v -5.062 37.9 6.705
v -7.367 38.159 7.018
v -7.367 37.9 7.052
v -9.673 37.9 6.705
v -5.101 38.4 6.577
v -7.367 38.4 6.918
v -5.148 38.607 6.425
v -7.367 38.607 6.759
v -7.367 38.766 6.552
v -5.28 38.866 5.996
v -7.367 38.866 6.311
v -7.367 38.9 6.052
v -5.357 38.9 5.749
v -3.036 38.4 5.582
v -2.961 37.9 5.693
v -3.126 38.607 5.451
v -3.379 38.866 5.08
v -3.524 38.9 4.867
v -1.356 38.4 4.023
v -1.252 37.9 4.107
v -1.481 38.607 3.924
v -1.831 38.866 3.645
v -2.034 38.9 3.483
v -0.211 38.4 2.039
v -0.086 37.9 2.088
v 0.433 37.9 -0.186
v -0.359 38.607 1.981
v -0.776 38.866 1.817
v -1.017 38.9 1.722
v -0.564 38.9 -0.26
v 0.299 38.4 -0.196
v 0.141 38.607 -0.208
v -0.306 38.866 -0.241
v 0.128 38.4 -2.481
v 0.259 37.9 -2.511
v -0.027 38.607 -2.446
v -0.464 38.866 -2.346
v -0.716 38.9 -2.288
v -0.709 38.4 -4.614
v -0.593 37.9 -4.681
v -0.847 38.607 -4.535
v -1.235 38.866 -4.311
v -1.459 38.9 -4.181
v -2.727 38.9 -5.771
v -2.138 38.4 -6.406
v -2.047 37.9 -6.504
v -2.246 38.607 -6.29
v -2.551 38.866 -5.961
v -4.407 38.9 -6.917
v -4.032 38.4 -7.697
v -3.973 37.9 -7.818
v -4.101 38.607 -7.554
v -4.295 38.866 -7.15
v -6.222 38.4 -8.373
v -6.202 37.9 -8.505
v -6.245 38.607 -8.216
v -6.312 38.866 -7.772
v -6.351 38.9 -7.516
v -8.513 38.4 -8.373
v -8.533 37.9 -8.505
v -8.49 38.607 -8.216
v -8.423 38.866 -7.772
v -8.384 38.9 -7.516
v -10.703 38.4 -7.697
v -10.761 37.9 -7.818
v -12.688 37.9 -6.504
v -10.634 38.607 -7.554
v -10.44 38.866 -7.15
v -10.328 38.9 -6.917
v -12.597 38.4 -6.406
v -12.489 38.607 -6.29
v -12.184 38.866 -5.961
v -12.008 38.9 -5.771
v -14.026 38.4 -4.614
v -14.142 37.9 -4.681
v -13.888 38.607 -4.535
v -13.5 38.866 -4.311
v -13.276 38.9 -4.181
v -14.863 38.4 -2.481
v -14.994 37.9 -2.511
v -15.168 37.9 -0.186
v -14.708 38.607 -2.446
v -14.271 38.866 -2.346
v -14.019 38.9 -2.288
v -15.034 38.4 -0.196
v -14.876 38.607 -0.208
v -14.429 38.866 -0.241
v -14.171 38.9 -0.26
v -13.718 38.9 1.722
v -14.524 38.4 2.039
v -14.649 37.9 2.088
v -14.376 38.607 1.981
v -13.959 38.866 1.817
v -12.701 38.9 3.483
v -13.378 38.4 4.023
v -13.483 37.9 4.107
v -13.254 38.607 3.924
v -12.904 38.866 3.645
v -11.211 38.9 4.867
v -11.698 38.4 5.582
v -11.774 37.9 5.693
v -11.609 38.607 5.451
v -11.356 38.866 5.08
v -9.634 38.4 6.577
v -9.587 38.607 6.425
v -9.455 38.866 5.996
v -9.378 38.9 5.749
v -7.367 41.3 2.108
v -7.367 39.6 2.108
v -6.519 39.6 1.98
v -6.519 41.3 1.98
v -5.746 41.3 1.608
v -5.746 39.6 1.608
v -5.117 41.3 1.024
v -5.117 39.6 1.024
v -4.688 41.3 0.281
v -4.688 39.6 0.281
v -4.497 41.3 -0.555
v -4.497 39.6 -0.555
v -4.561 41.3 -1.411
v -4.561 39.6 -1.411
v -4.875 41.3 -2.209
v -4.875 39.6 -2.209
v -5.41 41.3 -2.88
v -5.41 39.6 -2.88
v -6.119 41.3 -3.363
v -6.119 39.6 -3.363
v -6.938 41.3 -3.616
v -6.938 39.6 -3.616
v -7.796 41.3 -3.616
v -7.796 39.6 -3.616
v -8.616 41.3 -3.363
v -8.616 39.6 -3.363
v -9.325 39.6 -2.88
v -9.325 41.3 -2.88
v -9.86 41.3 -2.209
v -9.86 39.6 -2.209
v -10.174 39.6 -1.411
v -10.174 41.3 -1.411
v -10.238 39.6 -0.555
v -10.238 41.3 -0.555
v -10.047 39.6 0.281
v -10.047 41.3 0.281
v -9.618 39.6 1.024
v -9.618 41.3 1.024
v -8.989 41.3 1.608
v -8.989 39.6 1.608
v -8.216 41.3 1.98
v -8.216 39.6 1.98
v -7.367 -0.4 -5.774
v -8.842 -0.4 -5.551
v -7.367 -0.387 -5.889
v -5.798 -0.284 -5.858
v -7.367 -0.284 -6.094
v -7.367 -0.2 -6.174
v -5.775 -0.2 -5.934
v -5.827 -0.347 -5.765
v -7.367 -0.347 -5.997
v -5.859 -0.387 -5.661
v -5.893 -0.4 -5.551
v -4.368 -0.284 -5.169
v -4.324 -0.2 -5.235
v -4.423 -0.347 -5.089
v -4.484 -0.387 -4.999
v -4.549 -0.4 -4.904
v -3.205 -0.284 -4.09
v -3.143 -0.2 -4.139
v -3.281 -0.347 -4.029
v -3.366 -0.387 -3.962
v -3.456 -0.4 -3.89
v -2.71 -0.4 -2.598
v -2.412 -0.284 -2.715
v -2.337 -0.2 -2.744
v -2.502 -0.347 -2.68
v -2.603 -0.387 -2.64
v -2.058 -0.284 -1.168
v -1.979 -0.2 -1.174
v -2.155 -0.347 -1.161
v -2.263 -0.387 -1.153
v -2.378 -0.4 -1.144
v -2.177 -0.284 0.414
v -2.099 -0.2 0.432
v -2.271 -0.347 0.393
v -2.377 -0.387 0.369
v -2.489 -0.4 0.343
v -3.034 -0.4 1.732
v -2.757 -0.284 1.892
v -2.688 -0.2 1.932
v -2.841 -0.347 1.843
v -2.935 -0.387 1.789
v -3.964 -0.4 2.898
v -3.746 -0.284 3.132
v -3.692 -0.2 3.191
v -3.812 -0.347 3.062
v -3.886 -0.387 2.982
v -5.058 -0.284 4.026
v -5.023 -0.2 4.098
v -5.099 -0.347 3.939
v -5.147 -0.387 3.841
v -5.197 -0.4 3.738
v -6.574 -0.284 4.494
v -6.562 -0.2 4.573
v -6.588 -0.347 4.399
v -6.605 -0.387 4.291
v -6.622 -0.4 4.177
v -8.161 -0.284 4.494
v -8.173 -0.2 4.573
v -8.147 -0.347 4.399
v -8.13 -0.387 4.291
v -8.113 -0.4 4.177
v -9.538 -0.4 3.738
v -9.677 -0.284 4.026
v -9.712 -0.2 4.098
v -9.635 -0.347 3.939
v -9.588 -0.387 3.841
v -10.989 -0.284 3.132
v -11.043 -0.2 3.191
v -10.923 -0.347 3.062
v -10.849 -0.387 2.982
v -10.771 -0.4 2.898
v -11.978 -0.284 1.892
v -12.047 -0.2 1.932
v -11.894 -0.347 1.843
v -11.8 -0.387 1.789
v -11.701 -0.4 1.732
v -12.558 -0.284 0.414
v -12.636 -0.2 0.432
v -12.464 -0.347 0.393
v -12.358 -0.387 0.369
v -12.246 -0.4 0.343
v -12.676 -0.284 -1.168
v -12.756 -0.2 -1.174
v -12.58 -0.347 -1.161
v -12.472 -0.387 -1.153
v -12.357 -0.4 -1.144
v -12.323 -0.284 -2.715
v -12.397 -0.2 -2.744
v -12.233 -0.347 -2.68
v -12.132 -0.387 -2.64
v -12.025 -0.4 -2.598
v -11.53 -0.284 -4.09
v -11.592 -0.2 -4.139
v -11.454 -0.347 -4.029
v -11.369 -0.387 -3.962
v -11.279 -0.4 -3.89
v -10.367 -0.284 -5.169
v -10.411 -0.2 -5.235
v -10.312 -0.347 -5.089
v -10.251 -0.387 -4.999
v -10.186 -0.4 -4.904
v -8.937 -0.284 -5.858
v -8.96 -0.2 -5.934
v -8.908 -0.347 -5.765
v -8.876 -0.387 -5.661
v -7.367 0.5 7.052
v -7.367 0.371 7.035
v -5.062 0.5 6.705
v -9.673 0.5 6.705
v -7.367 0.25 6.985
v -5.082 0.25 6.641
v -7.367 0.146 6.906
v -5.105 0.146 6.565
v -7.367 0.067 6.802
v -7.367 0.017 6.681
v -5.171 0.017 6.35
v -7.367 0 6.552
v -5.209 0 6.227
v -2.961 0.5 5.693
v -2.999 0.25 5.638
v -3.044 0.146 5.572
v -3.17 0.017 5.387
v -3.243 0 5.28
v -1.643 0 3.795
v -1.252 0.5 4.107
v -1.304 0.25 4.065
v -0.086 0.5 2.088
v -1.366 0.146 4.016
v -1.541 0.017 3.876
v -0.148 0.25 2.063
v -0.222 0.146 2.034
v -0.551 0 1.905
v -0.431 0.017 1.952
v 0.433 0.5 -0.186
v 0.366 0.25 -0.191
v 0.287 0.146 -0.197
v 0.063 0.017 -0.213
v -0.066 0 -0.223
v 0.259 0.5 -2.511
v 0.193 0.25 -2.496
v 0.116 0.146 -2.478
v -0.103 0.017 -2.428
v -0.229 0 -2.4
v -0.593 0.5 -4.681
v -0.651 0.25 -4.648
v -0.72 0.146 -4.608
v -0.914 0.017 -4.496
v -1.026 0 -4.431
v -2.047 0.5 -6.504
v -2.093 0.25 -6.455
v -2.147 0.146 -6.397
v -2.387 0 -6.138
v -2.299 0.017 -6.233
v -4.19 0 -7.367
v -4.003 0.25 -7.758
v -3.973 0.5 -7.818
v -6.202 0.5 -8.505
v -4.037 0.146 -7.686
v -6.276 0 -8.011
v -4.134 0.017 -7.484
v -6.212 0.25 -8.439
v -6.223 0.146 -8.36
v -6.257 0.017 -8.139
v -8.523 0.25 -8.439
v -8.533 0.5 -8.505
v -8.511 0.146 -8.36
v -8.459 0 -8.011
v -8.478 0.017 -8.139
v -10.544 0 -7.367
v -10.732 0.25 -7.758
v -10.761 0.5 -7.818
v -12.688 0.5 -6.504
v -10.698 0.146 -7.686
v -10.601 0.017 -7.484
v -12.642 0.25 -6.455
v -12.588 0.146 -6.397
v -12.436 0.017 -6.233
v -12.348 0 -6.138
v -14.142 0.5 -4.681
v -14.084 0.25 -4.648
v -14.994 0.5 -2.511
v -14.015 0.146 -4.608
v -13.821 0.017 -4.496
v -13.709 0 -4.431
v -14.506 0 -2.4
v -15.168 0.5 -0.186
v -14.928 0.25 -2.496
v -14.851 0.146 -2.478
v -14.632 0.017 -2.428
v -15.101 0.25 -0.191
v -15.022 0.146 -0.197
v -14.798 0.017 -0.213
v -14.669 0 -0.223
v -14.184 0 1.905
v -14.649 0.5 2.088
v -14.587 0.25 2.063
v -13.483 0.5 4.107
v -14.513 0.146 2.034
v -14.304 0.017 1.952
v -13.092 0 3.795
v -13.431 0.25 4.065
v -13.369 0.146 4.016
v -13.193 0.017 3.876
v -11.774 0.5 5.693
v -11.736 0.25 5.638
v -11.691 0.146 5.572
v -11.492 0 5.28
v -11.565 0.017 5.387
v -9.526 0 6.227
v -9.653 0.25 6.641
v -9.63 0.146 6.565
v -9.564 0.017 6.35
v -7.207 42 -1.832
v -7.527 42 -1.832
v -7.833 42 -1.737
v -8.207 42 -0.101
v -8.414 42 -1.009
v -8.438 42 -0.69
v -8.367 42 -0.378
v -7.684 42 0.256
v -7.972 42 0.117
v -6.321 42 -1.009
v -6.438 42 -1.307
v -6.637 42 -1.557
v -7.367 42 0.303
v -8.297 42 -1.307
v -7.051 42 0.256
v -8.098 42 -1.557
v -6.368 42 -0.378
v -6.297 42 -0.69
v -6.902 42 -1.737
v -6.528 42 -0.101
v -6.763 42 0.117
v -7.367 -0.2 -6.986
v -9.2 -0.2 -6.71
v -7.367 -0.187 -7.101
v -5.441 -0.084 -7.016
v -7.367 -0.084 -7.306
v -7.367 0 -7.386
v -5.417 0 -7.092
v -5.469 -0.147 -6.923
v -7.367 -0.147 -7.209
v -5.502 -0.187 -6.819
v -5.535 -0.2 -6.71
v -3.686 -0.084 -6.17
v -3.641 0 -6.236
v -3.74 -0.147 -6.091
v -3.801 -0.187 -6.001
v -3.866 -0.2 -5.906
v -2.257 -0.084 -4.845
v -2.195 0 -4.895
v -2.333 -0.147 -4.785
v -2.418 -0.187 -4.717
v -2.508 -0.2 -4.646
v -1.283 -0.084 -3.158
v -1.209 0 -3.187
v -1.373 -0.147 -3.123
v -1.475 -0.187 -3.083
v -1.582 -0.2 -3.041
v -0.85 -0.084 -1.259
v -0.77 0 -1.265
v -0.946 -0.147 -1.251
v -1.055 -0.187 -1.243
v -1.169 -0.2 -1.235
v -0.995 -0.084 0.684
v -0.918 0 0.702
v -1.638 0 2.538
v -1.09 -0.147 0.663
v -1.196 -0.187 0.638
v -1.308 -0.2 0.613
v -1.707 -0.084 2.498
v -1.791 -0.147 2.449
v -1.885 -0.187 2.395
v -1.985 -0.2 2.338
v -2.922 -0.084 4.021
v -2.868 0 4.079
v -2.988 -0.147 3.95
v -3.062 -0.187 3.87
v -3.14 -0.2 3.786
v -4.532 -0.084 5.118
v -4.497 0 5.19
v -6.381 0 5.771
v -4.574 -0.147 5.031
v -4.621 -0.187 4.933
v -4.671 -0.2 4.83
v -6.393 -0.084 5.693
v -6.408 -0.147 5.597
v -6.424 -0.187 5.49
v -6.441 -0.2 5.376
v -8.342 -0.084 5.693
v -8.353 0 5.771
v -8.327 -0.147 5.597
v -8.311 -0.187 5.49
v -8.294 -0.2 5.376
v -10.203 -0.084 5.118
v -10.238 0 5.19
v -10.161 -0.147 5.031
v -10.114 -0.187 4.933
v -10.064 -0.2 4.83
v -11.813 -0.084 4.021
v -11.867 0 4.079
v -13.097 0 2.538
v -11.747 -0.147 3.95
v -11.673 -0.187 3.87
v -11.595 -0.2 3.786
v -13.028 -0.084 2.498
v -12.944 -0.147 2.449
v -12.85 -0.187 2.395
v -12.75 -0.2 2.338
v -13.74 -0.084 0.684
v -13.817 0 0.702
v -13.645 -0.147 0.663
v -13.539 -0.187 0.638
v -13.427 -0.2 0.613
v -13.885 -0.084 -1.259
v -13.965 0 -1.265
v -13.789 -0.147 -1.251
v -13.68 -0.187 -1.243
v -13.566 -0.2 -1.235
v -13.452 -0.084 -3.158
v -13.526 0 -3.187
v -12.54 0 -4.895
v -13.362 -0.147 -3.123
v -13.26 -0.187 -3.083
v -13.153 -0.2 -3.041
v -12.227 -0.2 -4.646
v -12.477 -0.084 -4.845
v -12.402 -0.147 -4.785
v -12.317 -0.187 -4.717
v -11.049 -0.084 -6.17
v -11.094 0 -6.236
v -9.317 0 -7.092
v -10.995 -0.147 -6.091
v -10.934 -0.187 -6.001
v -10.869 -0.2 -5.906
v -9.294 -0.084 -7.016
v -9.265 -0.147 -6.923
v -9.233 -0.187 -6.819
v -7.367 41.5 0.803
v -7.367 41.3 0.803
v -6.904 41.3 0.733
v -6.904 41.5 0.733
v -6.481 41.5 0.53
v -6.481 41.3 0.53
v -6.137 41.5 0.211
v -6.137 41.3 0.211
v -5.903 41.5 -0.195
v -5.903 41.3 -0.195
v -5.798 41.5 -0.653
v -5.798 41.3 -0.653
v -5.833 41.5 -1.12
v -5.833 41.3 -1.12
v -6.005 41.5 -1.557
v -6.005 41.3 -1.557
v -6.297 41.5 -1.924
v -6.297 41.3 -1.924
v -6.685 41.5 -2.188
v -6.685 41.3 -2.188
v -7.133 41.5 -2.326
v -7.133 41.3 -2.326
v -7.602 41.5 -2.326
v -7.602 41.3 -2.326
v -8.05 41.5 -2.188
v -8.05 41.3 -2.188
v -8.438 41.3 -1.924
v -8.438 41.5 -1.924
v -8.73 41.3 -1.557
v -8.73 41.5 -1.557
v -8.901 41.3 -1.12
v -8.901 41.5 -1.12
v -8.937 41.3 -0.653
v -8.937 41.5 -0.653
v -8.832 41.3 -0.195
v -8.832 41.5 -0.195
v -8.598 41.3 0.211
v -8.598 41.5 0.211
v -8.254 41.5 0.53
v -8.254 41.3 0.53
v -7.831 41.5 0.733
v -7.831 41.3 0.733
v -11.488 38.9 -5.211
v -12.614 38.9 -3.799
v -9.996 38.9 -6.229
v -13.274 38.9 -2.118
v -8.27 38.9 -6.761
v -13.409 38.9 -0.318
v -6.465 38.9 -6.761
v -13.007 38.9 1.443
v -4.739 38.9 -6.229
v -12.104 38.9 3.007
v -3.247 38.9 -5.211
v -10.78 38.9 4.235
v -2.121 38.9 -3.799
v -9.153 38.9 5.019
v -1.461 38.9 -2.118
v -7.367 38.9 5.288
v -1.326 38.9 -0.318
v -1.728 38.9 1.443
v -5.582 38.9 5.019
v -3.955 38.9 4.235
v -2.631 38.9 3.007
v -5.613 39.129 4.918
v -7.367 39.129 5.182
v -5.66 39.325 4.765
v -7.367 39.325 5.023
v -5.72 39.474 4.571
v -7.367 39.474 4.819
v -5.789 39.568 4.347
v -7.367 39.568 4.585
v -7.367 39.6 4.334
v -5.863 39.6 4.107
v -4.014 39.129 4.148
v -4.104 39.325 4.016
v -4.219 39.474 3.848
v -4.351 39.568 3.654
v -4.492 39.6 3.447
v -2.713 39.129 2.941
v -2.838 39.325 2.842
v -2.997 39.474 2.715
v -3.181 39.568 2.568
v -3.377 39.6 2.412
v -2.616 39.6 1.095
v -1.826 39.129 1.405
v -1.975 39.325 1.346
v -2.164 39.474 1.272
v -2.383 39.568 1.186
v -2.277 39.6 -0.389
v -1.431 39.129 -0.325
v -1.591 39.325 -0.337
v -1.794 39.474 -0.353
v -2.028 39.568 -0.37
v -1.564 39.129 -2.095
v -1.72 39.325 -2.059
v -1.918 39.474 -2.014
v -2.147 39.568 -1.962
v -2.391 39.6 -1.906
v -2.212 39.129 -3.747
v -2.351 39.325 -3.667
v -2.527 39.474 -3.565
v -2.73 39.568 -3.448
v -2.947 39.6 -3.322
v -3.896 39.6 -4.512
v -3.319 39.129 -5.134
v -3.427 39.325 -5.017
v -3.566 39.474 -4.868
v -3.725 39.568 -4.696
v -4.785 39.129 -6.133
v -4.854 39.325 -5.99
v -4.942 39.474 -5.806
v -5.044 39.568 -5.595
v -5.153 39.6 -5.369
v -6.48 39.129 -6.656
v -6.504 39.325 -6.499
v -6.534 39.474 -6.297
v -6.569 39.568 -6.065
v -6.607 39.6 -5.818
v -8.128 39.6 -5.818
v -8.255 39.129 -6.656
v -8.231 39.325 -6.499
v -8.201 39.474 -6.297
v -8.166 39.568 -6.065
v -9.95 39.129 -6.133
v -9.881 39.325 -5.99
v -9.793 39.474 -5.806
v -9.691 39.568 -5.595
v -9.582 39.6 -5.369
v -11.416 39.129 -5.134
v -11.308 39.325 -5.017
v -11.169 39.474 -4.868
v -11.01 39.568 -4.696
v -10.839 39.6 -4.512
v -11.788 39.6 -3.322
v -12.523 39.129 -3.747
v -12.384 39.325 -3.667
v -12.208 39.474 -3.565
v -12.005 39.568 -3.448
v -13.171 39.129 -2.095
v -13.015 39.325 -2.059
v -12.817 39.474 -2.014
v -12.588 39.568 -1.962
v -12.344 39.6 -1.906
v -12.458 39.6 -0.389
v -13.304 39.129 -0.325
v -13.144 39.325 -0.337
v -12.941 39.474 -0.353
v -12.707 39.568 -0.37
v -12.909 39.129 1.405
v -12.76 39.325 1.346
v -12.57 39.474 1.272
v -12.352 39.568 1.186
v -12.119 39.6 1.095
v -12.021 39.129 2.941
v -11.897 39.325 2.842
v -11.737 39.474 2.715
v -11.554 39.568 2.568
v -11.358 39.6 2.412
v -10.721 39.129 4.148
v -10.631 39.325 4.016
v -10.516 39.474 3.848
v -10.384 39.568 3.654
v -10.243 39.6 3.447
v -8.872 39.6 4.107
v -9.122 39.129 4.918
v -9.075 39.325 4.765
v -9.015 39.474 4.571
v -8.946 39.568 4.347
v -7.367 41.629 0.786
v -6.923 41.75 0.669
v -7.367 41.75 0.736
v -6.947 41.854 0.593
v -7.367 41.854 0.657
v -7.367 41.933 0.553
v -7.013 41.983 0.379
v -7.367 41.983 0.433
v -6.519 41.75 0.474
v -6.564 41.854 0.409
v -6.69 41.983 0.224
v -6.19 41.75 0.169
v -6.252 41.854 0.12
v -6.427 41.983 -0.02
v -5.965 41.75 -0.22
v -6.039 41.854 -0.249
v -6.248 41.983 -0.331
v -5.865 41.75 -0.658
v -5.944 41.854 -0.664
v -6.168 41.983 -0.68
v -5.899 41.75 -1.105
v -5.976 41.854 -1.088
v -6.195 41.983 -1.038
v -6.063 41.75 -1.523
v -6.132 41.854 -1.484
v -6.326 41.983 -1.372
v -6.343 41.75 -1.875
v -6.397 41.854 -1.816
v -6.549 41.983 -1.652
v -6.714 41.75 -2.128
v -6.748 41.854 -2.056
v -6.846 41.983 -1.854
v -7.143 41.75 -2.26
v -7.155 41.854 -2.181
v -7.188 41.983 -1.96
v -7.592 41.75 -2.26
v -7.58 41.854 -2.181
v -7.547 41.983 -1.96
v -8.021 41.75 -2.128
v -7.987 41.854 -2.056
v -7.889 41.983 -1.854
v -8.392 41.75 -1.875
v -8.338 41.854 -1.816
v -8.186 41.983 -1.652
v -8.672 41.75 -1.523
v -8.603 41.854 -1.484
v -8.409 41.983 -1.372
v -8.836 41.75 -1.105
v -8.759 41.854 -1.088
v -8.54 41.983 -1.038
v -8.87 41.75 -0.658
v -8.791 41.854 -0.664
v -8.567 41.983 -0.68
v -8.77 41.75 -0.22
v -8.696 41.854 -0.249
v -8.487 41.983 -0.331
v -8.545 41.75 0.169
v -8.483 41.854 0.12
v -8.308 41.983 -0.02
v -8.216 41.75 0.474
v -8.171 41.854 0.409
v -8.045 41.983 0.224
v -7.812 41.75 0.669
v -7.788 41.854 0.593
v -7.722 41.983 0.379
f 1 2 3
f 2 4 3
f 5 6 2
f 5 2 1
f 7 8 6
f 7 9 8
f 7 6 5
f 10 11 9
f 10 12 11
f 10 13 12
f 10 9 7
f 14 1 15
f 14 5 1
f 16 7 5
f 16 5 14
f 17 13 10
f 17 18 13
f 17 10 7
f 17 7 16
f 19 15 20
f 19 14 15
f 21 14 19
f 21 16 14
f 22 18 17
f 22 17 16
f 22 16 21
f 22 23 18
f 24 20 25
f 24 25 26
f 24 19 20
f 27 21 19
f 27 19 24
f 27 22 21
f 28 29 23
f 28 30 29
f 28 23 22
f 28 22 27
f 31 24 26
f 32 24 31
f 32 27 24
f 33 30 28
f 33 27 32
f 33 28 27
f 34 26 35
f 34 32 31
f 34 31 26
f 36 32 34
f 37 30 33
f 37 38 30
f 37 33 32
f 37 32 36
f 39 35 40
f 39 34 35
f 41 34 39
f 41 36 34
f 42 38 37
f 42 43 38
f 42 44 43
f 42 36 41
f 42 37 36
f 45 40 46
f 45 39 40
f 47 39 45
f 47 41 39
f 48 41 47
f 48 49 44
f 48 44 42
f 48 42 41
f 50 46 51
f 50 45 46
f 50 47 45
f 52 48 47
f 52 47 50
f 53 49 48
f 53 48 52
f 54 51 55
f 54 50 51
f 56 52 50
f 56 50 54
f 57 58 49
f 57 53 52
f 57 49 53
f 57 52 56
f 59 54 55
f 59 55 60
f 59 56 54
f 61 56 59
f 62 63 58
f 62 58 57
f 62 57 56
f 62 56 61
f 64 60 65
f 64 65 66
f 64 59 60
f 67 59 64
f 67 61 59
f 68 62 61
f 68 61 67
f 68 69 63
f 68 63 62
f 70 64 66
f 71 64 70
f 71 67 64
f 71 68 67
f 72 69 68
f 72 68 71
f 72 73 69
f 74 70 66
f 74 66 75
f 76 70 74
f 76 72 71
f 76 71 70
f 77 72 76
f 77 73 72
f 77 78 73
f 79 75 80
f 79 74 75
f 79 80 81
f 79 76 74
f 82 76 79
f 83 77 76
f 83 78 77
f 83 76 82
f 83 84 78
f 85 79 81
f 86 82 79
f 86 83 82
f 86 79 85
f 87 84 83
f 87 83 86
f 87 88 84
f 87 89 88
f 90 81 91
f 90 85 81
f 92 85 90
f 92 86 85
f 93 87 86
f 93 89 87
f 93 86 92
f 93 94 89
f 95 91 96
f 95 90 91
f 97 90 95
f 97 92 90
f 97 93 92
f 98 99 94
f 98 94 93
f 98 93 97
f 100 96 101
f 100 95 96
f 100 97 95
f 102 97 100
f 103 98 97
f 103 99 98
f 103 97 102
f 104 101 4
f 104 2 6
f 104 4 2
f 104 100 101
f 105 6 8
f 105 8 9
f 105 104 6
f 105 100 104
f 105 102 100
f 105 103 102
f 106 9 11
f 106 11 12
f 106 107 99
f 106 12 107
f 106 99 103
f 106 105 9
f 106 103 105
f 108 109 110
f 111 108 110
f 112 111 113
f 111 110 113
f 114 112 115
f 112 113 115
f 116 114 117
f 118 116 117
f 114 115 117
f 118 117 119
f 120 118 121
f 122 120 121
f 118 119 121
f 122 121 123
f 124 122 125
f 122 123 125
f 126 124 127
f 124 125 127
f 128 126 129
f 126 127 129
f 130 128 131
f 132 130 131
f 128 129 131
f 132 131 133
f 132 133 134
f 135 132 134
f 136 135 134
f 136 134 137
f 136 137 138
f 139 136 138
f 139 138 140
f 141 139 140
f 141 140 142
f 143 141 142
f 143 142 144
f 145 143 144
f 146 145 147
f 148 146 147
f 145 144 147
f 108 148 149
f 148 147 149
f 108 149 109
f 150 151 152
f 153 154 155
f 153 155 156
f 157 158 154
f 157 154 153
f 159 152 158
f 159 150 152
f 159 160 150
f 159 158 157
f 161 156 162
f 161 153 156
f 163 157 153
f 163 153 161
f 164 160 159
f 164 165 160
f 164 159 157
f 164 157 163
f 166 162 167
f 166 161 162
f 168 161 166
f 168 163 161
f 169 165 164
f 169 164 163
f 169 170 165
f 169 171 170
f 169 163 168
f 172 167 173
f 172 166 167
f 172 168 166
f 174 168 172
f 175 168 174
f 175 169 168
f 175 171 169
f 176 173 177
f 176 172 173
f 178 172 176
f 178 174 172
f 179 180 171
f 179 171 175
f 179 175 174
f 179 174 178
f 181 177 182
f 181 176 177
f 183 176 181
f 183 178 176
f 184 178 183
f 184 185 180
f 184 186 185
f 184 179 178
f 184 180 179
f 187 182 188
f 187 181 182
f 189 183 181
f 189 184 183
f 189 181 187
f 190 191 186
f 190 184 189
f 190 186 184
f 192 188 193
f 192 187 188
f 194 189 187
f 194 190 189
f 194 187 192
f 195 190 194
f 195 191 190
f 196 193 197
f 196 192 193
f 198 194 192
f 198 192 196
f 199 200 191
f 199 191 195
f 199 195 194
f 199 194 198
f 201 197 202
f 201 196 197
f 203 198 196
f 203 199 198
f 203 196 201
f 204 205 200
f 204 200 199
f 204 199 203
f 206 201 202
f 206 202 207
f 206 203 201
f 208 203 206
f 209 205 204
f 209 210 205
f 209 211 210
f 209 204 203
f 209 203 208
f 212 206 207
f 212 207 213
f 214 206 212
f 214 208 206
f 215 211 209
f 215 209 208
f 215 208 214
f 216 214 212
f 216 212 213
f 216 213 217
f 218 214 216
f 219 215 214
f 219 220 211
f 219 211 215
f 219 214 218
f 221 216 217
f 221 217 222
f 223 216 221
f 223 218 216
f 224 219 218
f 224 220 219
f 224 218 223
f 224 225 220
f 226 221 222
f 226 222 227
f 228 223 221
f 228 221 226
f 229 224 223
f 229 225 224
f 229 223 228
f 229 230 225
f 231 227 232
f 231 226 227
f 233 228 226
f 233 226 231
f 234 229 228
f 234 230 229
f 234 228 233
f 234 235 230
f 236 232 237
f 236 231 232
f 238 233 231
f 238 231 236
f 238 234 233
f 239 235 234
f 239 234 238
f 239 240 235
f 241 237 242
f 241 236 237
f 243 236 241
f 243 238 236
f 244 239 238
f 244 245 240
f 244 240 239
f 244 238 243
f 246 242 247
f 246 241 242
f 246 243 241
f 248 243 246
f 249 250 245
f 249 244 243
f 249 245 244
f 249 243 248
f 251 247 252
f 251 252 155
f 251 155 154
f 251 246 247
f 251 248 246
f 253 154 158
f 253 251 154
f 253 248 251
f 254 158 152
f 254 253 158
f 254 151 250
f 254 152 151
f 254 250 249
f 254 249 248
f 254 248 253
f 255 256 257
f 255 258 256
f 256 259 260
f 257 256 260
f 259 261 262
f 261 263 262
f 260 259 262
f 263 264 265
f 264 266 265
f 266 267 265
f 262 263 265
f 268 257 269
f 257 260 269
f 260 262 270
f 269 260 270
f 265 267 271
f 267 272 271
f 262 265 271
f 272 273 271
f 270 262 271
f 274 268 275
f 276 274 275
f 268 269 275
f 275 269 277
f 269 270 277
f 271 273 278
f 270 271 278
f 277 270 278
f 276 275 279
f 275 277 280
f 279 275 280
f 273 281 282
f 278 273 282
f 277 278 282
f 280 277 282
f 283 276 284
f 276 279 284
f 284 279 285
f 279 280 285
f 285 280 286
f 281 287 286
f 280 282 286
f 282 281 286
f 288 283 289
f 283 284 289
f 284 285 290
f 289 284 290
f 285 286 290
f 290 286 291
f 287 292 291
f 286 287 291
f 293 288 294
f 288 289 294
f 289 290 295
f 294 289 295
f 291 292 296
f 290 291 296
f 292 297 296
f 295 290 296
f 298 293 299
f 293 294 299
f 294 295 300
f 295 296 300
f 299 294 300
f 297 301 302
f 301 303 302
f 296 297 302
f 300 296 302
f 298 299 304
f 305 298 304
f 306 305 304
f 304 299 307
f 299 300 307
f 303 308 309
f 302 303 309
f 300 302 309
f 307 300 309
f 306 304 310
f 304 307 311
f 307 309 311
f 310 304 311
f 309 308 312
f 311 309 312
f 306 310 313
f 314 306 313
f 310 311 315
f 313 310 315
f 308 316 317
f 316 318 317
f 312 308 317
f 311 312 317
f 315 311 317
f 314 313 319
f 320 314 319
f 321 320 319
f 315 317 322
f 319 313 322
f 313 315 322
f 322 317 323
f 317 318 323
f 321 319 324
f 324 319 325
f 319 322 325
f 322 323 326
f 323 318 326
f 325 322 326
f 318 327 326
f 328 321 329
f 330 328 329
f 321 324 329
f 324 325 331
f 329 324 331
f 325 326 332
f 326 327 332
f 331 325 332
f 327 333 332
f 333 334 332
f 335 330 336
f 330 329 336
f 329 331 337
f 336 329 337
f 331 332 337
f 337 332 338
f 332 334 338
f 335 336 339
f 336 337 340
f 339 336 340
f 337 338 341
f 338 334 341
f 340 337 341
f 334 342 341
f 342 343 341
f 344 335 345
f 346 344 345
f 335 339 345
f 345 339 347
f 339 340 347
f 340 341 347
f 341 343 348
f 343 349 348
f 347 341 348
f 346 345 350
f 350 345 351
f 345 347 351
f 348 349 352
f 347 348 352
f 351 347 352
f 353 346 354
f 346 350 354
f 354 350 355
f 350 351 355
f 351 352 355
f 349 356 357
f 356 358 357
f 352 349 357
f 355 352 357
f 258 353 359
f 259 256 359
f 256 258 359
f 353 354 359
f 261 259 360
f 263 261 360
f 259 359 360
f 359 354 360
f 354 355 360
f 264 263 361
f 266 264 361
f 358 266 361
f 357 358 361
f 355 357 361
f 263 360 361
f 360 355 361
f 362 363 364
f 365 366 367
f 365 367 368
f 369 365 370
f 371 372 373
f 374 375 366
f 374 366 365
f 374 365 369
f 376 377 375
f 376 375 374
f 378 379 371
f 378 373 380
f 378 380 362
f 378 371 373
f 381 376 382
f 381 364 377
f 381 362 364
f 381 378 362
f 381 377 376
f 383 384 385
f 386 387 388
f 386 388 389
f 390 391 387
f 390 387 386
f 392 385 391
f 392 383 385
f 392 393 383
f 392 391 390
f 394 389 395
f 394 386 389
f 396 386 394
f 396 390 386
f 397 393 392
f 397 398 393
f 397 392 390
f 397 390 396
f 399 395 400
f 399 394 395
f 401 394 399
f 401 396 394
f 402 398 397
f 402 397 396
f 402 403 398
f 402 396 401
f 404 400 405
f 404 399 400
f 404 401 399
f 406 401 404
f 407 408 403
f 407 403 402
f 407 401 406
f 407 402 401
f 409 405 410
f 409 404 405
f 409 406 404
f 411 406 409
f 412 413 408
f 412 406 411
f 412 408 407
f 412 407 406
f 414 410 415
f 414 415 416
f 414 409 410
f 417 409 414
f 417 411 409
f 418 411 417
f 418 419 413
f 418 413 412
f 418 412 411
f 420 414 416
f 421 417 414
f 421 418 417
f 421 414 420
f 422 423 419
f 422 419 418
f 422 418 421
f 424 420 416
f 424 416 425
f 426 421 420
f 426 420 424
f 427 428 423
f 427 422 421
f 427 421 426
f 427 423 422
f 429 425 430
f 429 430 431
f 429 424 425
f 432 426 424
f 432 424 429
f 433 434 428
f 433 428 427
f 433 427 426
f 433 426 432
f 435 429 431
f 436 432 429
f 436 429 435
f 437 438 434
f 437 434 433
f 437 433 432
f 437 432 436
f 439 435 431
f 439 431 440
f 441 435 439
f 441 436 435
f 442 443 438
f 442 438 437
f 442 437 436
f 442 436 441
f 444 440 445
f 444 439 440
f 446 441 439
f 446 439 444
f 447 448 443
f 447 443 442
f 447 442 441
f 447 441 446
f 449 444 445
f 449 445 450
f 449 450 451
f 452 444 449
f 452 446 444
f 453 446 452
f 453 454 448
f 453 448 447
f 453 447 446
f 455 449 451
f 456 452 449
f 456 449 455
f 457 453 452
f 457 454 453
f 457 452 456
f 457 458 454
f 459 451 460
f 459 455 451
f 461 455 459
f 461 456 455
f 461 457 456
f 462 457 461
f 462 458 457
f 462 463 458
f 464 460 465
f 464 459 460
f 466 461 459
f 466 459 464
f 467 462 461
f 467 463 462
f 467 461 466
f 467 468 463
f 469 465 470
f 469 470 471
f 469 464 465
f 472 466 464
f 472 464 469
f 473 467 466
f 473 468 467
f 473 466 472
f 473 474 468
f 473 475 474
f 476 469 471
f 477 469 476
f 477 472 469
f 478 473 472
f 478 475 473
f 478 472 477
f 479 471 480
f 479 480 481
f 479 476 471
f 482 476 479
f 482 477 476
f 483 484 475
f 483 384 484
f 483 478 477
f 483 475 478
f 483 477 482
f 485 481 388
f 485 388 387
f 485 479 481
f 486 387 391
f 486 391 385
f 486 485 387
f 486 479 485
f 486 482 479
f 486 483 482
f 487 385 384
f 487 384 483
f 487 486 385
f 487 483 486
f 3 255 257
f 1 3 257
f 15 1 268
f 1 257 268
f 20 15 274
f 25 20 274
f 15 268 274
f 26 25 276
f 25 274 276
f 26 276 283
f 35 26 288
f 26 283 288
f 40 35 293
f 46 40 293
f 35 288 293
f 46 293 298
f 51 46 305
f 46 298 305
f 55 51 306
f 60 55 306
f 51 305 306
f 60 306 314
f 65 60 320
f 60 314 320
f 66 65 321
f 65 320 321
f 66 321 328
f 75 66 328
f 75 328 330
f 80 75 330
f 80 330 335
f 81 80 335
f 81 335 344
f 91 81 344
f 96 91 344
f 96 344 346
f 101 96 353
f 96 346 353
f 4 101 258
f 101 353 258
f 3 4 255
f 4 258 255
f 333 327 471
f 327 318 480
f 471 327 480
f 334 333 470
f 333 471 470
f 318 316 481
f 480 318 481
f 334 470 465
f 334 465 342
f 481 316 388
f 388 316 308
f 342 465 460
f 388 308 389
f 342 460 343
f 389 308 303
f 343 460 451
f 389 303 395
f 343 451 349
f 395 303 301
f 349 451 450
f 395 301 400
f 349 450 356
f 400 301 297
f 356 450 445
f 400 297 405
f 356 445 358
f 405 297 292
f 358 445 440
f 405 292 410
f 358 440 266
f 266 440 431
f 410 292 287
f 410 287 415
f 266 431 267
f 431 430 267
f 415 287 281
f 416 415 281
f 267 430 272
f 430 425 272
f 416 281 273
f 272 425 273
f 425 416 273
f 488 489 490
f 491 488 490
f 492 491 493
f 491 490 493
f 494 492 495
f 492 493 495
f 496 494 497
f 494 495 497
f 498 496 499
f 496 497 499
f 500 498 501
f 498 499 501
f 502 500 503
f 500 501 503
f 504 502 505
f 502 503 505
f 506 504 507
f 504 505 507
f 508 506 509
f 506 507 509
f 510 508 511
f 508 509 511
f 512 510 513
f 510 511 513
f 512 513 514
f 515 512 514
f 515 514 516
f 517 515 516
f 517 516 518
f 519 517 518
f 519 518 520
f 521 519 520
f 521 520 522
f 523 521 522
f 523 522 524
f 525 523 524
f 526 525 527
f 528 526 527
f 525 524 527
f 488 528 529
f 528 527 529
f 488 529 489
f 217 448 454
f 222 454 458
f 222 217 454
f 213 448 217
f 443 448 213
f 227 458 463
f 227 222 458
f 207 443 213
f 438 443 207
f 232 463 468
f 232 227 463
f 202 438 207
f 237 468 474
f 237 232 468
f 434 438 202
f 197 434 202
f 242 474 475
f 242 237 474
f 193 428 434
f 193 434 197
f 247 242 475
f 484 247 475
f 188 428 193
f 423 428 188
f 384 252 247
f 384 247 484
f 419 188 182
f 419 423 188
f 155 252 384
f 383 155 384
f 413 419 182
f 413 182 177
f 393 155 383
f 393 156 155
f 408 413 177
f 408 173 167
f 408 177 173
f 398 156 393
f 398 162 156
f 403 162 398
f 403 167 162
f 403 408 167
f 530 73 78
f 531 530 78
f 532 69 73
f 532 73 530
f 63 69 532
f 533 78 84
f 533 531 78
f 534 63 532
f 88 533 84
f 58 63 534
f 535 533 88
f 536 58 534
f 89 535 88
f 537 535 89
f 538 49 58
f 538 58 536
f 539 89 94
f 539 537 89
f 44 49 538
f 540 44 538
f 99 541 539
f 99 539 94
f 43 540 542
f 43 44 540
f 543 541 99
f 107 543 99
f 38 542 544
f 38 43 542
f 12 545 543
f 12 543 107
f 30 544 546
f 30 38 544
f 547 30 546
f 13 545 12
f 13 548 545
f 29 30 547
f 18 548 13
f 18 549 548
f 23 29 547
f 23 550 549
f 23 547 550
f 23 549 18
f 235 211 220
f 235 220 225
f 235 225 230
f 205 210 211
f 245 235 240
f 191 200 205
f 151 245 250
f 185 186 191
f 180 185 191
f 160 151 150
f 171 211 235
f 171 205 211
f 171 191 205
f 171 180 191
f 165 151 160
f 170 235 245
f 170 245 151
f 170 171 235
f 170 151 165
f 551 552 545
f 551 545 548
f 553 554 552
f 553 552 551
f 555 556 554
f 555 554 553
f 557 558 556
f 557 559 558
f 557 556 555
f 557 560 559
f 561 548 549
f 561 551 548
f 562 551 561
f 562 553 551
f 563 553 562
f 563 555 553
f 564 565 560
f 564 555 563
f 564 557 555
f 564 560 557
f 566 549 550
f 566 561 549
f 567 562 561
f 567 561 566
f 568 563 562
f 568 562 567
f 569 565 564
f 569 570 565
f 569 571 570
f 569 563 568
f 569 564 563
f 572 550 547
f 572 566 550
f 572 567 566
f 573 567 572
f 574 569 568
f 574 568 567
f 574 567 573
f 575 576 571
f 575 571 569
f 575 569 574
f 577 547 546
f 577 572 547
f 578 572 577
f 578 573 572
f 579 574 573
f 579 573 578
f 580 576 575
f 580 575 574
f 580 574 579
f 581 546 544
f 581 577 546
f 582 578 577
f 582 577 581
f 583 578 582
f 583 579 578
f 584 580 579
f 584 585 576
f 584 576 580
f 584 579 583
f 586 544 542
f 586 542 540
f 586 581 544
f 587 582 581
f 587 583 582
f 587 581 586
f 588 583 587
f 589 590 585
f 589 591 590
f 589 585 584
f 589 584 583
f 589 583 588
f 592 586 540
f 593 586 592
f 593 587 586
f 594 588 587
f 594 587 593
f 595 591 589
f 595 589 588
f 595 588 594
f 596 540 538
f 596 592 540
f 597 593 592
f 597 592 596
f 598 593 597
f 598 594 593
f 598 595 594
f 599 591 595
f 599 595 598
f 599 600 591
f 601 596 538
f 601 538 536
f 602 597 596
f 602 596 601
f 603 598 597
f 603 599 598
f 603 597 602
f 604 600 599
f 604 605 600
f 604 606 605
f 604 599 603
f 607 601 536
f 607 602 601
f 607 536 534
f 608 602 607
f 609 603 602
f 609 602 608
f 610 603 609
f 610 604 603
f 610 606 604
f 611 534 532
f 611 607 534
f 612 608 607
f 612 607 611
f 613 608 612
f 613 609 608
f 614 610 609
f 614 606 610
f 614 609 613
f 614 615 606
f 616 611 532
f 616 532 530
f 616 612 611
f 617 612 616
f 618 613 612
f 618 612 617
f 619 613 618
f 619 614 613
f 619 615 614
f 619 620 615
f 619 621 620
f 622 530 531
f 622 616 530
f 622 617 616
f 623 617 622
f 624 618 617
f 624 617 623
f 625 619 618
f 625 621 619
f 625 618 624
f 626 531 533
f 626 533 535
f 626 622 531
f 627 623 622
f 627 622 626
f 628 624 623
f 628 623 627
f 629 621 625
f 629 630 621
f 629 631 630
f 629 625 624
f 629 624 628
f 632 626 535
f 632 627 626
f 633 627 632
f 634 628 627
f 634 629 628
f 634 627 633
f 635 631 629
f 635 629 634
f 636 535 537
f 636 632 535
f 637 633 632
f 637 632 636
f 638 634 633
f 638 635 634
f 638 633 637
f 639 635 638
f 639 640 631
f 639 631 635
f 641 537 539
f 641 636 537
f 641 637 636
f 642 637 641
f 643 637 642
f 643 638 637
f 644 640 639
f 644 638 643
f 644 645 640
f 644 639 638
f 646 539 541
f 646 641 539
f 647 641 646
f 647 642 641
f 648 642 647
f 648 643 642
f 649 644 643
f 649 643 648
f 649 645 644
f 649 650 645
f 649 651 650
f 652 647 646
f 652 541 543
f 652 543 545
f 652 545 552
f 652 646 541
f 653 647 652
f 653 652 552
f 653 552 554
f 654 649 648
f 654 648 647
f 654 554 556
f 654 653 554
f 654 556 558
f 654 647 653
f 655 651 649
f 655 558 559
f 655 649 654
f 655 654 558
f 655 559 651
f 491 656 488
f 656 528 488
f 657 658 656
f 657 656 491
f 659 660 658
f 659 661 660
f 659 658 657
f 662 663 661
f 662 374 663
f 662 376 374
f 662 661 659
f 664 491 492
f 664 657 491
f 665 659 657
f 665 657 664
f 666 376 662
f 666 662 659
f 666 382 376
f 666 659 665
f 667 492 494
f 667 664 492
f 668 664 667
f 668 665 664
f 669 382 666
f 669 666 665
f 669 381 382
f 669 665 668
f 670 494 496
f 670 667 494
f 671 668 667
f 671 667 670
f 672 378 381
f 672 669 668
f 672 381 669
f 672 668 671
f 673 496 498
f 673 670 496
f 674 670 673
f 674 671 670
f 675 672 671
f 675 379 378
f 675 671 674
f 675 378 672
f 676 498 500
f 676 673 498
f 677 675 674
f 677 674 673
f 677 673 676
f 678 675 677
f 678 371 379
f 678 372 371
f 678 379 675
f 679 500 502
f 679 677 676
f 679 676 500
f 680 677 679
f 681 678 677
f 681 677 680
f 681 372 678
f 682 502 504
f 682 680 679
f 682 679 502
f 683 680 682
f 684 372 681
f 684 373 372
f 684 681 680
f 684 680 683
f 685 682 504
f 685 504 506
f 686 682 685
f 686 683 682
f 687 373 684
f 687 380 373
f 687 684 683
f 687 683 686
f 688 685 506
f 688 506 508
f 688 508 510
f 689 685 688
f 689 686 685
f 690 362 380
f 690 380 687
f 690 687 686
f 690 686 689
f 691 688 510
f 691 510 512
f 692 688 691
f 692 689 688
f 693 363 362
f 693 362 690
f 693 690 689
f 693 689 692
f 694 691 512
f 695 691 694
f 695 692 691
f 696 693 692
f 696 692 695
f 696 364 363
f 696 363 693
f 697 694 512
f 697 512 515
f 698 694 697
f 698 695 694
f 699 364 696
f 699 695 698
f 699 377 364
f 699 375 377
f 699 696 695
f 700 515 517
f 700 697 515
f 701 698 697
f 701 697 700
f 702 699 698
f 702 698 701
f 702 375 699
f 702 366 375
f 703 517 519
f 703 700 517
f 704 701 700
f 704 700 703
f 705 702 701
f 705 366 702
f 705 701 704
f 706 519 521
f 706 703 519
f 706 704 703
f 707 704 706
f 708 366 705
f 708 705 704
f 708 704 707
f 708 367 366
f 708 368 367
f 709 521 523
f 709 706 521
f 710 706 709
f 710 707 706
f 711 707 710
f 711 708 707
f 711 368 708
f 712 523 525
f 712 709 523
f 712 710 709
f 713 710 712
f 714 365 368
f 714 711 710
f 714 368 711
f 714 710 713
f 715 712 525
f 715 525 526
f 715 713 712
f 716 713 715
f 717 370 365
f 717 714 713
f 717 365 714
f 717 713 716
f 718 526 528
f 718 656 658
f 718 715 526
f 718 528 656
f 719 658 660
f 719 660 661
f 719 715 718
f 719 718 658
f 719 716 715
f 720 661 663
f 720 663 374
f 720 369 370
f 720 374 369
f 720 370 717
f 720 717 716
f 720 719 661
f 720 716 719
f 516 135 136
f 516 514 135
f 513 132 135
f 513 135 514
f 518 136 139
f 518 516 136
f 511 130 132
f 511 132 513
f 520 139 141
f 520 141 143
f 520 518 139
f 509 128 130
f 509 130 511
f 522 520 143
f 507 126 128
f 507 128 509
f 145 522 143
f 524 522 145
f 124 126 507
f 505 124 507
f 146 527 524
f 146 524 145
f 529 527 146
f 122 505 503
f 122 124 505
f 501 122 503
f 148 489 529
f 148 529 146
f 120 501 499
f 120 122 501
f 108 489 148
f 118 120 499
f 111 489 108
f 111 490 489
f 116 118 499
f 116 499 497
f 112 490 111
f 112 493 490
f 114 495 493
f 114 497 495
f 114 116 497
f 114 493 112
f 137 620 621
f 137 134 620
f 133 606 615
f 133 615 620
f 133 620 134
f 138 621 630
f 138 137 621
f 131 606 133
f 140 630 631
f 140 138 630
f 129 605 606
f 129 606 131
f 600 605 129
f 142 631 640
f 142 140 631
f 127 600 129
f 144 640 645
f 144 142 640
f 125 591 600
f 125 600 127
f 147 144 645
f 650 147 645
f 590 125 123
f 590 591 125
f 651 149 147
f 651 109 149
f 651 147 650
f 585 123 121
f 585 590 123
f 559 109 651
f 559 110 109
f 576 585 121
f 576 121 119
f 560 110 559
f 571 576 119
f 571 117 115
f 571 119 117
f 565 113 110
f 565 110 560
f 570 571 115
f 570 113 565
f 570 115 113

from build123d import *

# Parameters (mm, degrees)
SKETCH1_R            = 7.822299743
BOSS_EXTRUDE1_DEPTH  = 38.9
FILLET1_R            = 1
SKETCH7_R            = 6.058269956
BOSS_EXTRUDE7_DEPTH  = 0.7
FILLET5_R            = 1
SKETCH8_R            = 2.878199419
BOSS_EXTRUDE8_DEPTH  = 1.7
SKETCH9_R            = 1.57347679
BOSS_EXTRUDE9_DEPTH  = 0.7
FILLET7_R            = 0.5
SKETCH10_R           = 6.615584601
BOSS_EXTRUDE11_DEPTH = 0.2
FILLET8_R            = 0.5
FILLET9_R            = 0.5
SKETCH11_R           = 5.403530489
BOSS_EXTRUDE12_DEPTH = 0.2
FILLET10_R           = 0.5


with BuildPart() as part:
    # Sketch1 → Boss-Extrude1 (new body)
    with BuildSketch(Plane(origin=(0, 0, 0), x_dir=(1, 0, 0), z_dir=(0, 1, 0))):
        with Locations(Location((-7.367466469, 0.770235131, 0), (0, 0, 270))):
            Circle(SKETCH1_R)
    extrude(amount=BOSS_EXTRUDE1_DEPTH)

    # Fillet1
    fillet1_edges = [part.edges().sort_by_distance(p)[0] for p in [
        (-7.367466469, 38.9, -8.592534873),
    ]]
    fillet(fillet1_edges, radius=FILLET1_R)

    # Sketch7 → Boss-Extrude7 (add)
    with BuildSketch(Plane(origin=(0, 38.9, 0), x_dir=(1, 0, 0), z_dir=(0, 1, 0))):
        with Locations(Location((-7.367466469, 0.770235131, 0), (0, 0, 270))):
            Circle(SKETCH7_R)
    extrude(amount=BOSS_EXTRUDE7_DEPTH)

    # Fillet5
    # the kernel refuses this fillet: 1 mm, written as the material it takes off along each edge
    with BuildSketch(Plane(origin=(-7.367466469, 39.6, -0.770235131), x_dir=(0, 0, 1), z_dir=(-1, 0, 0))) as fillet5_piece_1:
        with BuildLine():
            CenterArc((5.104330755, -1), FILLET5_R, 17.457603124, 72.542396876)
            Line((5.104330755, 0), (5.104330755, 0.02))
            Line((5.104330755, 0.02), (6.058269956, 0.02))
            Line((6.058269956, 0.02), (6.078269956, 0))
            ThreePointArc((6.078269956, 0), (6.078269956, -0.35), (6.07734874, -0.694))
            Line((6.07734874, -0.694), (6.058269956, -0.7))
        make_face()
    revolve(axis=Axis((-7.367466469, 39.6, -0.770235131), (0, 1, 0)), mode=Mode.SUBTRACT)

    # Sketch8 → Boss-Extrude8 (add)
    with BuildSketch(Plane(origin=(0, 39.6, 0), x_dir=(1, 0, 0), z_dir=(0, 1, 0))):
        with Locations(Location((-7.367466469, 0.770235131, 0), (0, 0, 270))):
            Circle(SKETCH8_R)
    extrude(amount=BOSS_EXTRUDE8_DEPTH)

    # Sketch9 → Boss-Extrude9 (add)
    with BuildSketch(Plane(origin=(0, 41.3, 0), x_dir=(1, 0, 0), z_dir=(0, 1, 0))):
        with Locations(Location((-7.367466469, 0.770235131, 0), (0, 0, 270))):
            Circle(SKETCH9_R)
    extrude(amount=BOSS_EXTRUDE9_DEPTH)

    # Fillet7
    fillet7_edges = [part.edges().sort_by_distance(p)[0] for p in [
        (-7.367466469, 42, -2.343711921),
    ]]
    fillet(fillet7_edges, radius=FILLET7_R)

    # Sketch10 → Boss-Extrude11 (add)
    with BuildSketch(Plane.XZ):
        with Locations(Location((-7.367466469, -0.770235131, 0), (0, 0, 270))):
            Circle(SKETCH10_R)
    extrude(amount=BOSS_EXTRUDE11_DEPTH)

    # Fillet8
    fillet8_edges = [part.edges().sort_by_distance(p)[0] for p in [
        (-7.367466469, 0, -8.592534873),
    ]]
    fillet(fillet8_edges, radius=FILLET8_R)

    # Fillet9
    # the kernel refuses this fillet: 0.5 mm, written as the material it takes off along each edge
    with BuildSketch(Plane(origin=(-7.367466469, -0.2, -0.770235131), x_dir=(0, 0, -1), z_dir=(-1, 0, 0))) as fillet9_piece_1:
        with BuildLine():
            CenterArc((6.215584601, -0.5), FILLET9_R, 36.869897645, 53.130102355)
            Line((6.215584601, 0), (6.215584601, 0.01))
            Line((6.215584601, 0.01), (6.615584601, 0.01))
            Line((6.615584601, 0.01), (6.625584601, 0))
            ThreePointArc((6.625584601, 0), (6.625584601, -0.1), (6.623584601, -0.194))
            Line((6.623584601, -0.194), (6.615584601, -0.2))
        make_face()
    revolve(axis=Axis((-7.367466469, -0.2, -0.770235131), (0, -1, 0)), mode=Mode.SUBTRACT)

    # Sketch11 → Boss-Extrude12 (add)
    with BuildSketch(Plane.XZ.offset(0.2)):
        with Locations(Location((-7.367466469, -0.770235131, 0), (0, 0, 270))):
            Circle(SKETCH11_R)
    extrude(amount=BOSS_EXTRUDE12_DEPTH)

    # Fillet10
    # the kernel refuses this fillet: 0.5 mm, written as the material it takes off along each edge
    with BuildSketch(Plane(origin=(-7.367466469, -0.4, -0.770235131), x_dir=(0, 0, -1), z_dir=(-1, 0, 0))) as fillet10_piece_1:
        with BuildLine():
            CenterArc((5.003530489, -0.5), FILLET10_R, 36.869897645, 53.130102355)
            Line((5.003530489, 0), (5.003530489, 0.01))
            Line((5.003530489, 0.01), (5.403530489, 0.01))
            Line((5.403530489, 0.01), (5.413530489, 0))
            ThreePointArc((5.413530489, 0), (5.413530489, -0.1), (5.411530489, -0.194))
            Line((5.411530489, -0.194), (5.403530489, -0.2))
        make_face()
    revolve(axis=Axis((-7.367466469, -0.4, -0.770235131), (0, -1, 0)), mode=Mode.SUBTRACT)


solid = part.part
